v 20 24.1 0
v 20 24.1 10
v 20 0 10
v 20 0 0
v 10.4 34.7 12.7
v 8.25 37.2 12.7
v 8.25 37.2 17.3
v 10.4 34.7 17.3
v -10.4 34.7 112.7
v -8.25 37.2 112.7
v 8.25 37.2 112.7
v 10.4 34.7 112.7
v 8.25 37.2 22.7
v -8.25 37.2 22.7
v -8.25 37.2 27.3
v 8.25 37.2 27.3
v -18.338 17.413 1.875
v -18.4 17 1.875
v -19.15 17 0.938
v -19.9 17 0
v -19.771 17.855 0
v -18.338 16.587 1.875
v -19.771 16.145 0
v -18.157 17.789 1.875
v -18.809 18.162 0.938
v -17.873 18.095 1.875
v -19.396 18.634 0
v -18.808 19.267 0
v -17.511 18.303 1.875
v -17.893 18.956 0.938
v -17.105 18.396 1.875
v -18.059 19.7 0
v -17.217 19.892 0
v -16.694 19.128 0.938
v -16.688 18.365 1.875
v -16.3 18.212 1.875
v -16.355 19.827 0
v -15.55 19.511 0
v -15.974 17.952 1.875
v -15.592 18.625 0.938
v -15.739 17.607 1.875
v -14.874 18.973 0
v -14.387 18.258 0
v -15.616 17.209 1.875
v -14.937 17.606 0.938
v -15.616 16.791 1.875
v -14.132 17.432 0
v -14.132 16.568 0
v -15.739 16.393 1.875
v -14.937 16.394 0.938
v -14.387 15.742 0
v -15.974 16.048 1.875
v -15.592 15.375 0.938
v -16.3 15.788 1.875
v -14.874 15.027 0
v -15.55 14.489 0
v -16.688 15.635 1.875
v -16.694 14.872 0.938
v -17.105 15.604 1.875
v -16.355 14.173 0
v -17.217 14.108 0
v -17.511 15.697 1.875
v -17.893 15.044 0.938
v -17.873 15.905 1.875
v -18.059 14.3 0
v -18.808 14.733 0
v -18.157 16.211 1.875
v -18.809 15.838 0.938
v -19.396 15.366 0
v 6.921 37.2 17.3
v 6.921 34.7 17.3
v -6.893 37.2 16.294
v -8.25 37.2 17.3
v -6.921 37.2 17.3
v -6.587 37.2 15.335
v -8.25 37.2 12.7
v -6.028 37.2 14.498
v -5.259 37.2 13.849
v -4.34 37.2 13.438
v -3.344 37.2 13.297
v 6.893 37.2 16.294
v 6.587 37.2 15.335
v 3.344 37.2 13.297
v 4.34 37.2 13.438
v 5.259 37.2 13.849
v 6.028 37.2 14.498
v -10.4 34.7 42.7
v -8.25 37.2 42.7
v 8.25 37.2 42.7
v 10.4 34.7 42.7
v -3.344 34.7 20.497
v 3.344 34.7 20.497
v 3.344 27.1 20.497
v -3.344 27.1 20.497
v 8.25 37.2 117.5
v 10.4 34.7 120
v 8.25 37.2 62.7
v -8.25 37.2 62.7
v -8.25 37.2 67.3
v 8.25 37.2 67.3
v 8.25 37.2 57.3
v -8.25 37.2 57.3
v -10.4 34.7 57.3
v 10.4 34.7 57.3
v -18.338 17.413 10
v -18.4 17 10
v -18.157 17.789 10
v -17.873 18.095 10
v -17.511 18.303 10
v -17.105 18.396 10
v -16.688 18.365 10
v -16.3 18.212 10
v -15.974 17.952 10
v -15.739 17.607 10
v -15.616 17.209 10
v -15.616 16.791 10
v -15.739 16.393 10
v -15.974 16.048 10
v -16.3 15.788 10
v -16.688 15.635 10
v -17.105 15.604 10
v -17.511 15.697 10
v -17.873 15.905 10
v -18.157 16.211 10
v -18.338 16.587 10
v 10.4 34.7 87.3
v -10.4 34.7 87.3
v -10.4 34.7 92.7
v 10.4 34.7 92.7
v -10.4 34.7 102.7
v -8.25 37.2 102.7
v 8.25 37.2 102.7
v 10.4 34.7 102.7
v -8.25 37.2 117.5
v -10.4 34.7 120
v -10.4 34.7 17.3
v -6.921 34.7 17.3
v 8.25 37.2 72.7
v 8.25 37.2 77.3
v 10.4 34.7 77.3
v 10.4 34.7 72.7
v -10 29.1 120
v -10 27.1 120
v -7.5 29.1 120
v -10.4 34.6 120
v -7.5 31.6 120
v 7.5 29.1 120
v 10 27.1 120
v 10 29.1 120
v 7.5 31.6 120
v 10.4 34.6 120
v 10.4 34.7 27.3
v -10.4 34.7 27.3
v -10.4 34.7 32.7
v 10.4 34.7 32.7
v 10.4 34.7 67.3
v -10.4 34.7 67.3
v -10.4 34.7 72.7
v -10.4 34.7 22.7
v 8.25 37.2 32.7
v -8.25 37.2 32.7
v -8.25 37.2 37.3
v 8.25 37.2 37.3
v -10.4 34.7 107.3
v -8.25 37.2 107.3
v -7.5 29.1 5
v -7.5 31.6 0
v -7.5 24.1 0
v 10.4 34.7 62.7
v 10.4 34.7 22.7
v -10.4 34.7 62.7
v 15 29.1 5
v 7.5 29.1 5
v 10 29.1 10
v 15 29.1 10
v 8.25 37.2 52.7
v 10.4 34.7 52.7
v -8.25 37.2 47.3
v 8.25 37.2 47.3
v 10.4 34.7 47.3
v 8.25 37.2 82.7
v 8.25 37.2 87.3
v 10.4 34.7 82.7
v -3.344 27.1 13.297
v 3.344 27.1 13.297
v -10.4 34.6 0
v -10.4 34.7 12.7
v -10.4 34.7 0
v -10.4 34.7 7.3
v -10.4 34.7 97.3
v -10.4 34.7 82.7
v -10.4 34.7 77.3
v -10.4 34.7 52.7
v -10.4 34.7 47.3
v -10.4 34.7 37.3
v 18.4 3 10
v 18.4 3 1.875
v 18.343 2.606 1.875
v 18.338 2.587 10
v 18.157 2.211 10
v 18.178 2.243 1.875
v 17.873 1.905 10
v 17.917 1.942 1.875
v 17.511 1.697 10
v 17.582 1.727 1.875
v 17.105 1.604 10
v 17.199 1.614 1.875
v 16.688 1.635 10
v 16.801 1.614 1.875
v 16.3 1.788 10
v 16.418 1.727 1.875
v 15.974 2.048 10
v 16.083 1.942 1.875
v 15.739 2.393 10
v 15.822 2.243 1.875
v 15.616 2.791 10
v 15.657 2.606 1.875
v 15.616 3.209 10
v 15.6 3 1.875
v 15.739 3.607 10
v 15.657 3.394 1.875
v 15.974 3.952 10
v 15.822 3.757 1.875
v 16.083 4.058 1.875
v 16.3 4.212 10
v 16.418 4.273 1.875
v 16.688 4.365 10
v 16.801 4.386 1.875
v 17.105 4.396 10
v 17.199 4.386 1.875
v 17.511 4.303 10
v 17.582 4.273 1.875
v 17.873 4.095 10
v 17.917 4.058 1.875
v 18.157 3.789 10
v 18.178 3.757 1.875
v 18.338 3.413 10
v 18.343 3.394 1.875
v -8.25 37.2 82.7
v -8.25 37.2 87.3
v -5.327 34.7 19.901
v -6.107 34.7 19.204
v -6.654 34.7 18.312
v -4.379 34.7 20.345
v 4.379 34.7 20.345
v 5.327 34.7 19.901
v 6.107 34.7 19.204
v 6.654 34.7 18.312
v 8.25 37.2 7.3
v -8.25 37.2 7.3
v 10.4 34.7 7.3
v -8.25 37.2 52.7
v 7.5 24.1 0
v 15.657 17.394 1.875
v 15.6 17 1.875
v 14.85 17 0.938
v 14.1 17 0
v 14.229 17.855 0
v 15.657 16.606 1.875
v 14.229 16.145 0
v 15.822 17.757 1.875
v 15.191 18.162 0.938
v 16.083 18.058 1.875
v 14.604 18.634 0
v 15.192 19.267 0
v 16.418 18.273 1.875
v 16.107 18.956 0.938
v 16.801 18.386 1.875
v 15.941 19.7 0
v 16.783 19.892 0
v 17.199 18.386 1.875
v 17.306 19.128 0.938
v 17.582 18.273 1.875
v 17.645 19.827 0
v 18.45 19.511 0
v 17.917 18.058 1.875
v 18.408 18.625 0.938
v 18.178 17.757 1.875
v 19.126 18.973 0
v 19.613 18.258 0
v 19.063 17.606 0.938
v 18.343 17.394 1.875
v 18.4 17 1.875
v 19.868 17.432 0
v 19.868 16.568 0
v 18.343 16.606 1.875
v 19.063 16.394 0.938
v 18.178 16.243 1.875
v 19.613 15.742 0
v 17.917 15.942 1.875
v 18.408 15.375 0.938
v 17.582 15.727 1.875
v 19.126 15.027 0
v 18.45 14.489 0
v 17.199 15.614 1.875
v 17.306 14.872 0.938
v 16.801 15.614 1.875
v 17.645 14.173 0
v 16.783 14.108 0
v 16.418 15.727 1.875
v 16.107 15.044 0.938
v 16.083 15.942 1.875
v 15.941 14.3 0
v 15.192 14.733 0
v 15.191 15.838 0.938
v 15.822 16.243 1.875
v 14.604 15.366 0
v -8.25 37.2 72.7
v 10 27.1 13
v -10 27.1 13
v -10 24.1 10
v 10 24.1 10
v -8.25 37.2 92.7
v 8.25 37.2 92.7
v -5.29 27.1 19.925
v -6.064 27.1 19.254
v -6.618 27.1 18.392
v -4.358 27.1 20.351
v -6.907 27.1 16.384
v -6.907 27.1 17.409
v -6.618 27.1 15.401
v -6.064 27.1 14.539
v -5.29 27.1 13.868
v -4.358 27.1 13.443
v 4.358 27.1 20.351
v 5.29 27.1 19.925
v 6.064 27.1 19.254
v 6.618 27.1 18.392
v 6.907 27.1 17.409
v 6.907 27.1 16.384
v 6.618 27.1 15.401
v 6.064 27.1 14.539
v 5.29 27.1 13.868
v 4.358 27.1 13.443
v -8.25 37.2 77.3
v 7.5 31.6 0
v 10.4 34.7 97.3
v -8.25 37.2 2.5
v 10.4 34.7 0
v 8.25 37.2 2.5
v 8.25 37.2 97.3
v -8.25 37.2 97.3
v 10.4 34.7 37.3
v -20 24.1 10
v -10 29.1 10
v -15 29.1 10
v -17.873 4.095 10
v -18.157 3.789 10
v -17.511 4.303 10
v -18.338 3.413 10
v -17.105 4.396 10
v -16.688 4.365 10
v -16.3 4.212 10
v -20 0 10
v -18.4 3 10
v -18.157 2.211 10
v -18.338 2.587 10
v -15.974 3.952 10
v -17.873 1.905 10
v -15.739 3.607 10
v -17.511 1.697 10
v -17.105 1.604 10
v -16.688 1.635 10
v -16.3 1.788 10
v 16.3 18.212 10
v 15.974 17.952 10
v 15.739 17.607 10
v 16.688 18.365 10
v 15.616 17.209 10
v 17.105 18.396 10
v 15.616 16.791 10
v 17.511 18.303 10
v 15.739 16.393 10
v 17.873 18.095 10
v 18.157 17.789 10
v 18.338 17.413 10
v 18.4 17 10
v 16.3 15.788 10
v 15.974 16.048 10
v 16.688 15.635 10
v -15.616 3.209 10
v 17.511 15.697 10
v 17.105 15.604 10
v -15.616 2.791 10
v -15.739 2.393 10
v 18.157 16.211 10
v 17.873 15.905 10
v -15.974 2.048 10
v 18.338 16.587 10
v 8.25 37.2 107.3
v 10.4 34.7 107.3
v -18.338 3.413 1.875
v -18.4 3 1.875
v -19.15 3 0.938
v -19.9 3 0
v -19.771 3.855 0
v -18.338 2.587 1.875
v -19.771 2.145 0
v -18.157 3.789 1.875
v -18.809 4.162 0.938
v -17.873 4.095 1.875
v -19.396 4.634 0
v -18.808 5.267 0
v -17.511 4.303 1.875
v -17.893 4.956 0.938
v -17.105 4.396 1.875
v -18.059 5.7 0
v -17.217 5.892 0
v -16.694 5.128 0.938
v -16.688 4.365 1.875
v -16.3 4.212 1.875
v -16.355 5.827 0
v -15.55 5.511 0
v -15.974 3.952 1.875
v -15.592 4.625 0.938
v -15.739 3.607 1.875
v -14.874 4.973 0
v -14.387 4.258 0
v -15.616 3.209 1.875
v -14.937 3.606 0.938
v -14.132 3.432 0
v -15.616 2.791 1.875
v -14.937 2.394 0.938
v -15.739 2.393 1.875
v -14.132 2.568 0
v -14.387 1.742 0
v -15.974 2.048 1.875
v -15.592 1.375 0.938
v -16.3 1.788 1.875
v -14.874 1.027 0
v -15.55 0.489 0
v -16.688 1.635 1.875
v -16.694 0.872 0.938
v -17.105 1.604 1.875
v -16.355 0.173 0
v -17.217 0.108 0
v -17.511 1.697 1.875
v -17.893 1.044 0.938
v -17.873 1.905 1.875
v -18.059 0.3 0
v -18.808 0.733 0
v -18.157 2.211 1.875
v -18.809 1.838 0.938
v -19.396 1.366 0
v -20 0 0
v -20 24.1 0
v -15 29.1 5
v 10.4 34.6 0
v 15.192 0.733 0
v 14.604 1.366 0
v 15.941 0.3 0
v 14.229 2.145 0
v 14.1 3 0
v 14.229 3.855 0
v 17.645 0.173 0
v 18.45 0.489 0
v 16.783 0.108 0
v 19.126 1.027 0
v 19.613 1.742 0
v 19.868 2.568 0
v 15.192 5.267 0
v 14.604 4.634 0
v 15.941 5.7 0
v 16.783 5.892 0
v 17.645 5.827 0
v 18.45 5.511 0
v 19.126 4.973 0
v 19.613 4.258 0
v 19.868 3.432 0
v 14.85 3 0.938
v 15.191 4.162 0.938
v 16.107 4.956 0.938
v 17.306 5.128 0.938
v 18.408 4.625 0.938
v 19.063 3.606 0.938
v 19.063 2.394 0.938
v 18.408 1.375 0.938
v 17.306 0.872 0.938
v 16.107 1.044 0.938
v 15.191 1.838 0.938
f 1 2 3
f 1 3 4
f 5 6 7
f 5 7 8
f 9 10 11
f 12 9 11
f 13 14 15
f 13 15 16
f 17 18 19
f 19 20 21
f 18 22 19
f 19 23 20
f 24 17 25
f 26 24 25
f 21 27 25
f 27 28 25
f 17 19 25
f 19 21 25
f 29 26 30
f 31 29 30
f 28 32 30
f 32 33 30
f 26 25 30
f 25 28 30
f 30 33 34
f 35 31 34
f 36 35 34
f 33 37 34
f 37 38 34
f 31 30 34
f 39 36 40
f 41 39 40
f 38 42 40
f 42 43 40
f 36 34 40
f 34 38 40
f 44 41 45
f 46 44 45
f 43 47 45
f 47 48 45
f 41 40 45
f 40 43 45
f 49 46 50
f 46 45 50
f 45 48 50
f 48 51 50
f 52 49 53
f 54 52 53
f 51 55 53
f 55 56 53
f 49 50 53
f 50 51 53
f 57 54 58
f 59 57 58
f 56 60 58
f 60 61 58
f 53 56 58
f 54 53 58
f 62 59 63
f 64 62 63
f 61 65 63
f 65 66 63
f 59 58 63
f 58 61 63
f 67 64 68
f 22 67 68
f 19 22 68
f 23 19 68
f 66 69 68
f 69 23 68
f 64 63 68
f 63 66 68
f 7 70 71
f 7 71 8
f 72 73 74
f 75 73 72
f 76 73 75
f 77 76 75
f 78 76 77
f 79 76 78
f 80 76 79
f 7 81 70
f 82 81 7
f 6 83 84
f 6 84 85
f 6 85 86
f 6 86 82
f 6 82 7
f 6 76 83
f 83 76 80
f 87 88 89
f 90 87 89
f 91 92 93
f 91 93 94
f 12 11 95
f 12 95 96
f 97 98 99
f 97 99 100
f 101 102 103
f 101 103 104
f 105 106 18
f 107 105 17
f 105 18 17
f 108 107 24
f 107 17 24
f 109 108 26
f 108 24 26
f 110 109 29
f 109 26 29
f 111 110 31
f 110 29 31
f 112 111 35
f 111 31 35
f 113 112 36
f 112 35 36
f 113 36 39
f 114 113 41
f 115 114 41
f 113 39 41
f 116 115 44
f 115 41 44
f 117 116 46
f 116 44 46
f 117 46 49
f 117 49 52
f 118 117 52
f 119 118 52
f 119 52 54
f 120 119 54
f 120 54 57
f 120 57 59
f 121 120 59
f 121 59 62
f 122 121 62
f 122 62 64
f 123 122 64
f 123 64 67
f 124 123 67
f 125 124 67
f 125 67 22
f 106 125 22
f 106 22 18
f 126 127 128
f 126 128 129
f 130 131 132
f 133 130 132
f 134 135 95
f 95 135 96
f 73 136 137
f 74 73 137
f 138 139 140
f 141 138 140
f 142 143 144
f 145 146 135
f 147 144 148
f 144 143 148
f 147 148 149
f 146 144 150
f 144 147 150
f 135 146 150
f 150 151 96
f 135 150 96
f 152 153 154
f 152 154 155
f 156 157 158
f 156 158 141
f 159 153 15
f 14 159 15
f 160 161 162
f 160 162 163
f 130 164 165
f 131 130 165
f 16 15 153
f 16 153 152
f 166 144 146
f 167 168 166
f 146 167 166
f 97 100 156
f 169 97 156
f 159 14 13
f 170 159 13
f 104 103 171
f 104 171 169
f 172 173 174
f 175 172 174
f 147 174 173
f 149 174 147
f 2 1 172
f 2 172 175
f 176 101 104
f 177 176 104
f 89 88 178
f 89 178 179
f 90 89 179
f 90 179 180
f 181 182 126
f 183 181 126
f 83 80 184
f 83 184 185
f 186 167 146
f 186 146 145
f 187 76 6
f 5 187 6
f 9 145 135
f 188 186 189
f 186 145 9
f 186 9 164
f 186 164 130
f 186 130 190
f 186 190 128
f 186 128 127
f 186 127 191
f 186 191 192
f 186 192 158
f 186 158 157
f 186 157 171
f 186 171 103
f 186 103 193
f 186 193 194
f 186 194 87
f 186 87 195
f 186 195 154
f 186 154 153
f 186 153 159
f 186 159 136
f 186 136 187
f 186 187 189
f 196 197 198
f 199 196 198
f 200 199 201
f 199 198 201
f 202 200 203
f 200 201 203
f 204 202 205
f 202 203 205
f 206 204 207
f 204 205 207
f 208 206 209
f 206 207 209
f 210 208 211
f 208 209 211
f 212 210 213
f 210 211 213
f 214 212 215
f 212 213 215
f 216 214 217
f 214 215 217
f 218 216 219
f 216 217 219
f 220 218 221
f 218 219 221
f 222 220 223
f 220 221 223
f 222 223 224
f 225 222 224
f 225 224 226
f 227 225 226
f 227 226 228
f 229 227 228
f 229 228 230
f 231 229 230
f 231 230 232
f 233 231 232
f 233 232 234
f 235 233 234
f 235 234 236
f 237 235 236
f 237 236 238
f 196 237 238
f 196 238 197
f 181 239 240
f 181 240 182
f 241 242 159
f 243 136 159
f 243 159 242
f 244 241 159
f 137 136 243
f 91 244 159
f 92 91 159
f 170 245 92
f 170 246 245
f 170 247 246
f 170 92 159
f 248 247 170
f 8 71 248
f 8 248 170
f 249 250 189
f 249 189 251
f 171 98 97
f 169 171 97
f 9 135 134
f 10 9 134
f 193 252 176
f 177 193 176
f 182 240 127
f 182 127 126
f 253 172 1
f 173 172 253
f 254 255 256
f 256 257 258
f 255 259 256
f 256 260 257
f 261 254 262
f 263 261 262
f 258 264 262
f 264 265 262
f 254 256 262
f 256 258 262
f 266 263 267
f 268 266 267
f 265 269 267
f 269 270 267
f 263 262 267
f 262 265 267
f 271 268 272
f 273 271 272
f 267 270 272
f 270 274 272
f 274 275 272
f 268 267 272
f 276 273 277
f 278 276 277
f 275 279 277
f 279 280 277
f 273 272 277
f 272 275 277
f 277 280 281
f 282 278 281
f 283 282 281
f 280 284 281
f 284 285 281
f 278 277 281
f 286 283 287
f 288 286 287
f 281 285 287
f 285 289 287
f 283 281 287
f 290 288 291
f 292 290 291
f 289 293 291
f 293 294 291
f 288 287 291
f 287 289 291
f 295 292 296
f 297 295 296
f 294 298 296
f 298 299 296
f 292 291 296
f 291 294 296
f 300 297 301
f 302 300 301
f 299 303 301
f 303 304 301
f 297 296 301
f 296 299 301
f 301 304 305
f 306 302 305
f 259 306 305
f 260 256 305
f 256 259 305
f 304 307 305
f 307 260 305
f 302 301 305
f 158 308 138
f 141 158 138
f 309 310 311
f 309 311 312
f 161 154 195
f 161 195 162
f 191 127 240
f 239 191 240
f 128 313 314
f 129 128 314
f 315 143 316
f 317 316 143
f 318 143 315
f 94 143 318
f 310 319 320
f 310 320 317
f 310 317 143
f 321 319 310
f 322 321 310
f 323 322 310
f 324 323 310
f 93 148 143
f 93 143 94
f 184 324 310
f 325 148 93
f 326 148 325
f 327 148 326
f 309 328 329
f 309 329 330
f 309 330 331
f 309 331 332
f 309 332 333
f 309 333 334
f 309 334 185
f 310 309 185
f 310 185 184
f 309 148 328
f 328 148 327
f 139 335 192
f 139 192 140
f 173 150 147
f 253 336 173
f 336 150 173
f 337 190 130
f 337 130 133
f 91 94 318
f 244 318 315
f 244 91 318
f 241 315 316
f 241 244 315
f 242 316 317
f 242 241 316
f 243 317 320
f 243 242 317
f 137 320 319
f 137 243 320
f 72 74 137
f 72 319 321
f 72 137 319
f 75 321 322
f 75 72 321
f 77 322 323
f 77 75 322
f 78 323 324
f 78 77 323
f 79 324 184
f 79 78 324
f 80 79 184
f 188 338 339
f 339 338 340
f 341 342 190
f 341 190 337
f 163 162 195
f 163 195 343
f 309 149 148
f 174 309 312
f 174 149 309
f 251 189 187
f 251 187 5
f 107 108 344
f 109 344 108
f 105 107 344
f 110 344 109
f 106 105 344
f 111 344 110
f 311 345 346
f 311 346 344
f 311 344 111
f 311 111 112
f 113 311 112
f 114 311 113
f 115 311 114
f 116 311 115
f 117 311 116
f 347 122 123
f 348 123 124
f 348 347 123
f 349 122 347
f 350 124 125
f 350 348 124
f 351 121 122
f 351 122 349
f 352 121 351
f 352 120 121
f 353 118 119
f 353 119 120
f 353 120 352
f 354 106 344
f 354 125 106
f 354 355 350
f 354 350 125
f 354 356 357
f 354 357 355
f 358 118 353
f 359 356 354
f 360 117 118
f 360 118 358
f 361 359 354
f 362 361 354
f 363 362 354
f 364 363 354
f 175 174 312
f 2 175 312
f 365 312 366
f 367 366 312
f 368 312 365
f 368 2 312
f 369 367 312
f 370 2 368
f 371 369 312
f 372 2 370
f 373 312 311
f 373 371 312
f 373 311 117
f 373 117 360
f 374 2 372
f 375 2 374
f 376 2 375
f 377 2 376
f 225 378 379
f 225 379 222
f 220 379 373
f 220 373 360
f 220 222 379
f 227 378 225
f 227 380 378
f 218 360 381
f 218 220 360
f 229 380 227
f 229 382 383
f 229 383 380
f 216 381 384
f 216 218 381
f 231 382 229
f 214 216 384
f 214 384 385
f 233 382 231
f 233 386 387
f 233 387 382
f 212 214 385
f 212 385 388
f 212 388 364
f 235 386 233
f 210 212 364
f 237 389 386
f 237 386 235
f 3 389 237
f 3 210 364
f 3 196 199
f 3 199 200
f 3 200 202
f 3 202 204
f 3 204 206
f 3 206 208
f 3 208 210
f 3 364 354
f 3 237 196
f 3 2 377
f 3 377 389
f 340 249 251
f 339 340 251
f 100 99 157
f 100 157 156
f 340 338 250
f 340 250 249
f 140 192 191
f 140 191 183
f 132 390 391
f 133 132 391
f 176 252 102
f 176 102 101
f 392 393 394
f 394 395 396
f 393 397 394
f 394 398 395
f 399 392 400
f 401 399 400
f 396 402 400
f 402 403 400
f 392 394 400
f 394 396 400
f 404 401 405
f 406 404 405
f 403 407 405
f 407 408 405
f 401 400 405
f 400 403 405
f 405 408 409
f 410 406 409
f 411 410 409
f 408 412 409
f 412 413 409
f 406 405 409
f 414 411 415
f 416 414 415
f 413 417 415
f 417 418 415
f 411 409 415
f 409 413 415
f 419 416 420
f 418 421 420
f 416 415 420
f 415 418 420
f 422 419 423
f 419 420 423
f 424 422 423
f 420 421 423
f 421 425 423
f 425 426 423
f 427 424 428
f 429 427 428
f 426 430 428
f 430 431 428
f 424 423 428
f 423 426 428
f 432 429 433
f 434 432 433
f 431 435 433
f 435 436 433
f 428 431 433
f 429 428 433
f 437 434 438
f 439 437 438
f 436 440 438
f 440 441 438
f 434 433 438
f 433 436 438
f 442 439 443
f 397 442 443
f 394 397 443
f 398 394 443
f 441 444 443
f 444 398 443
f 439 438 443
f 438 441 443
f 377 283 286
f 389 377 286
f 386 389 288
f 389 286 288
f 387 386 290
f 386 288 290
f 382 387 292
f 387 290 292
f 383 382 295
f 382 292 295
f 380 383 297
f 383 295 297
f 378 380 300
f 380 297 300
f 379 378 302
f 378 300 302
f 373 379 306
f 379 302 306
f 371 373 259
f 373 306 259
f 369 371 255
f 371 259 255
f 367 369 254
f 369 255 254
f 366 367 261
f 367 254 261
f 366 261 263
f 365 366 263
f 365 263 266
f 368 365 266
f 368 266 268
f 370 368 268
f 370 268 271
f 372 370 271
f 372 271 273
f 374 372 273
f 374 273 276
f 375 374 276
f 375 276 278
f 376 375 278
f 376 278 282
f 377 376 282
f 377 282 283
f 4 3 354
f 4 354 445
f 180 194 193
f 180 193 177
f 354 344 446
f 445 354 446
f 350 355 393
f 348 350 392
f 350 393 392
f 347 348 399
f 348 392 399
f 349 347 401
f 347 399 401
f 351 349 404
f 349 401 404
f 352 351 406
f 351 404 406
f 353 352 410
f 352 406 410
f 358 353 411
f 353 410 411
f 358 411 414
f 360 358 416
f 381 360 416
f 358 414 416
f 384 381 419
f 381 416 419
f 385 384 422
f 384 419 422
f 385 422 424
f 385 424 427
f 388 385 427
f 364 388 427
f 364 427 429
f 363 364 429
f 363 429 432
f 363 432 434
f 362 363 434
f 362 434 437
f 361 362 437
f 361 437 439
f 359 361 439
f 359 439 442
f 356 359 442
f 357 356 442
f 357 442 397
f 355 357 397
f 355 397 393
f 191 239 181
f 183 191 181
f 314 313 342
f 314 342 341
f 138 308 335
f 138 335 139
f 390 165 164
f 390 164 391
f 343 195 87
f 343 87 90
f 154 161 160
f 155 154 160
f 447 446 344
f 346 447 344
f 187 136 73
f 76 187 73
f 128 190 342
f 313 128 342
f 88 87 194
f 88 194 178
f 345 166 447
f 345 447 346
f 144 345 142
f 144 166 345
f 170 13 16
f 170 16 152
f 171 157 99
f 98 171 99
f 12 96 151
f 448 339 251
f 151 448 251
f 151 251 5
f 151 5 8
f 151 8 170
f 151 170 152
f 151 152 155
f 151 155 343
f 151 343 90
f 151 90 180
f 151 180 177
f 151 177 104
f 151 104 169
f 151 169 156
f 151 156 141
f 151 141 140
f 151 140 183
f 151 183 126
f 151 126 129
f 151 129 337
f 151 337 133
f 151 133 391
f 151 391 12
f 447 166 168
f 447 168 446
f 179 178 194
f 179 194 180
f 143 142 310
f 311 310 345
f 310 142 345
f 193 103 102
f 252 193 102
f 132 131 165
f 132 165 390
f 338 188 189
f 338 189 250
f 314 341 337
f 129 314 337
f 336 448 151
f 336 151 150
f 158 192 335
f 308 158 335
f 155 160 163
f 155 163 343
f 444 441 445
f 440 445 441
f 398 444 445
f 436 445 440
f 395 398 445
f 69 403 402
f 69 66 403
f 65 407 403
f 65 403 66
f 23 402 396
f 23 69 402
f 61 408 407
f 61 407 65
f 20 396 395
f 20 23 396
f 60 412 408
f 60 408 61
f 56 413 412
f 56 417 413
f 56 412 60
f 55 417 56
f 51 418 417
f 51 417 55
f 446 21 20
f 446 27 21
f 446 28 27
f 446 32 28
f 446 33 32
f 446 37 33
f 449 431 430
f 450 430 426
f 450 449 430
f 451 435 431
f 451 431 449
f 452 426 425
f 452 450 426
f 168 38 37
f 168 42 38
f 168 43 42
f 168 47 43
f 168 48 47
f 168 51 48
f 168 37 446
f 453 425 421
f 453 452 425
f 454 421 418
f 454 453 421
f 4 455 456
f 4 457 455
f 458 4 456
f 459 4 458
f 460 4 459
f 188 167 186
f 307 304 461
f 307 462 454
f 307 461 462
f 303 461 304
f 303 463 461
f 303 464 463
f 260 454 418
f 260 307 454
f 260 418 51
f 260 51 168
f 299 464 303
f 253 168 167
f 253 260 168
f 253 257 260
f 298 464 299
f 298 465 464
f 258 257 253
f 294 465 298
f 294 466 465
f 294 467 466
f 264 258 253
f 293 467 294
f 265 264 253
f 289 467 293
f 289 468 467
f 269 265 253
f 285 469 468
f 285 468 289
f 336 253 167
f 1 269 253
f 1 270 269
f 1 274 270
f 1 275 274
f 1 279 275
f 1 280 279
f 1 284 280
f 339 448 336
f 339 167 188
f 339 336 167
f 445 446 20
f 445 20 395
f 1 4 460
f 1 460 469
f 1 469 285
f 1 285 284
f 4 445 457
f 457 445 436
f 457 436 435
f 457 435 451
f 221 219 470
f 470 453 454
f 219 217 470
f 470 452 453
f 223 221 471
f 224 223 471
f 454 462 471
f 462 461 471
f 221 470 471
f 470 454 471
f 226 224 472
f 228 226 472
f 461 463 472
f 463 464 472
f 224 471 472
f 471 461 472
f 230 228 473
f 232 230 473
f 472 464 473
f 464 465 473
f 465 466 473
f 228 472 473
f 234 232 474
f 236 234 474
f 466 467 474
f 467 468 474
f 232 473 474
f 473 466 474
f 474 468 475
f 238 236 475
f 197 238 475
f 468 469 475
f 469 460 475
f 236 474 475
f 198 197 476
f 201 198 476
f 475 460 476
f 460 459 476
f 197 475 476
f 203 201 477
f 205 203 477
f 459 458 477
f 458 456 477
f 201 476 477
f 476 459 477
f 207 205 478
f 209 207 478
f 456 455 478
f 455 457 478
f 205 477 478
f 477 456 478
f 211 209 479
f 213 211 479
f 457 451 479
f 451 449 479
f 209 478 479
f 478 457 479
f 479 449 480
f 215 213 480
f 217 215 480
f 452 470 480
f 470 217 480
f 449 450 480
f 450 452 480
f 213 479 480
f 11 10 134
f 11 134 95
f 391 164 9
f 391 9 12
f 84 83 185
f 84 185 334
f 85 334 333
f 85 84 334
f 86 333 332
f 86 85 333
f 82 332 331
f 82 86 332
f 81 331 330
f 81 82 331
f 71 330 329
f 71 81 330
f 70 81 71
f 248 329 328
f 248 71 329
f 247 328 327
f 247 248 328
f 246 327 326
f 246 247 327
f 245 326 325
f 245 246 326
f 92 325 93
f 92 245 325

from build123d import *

# Parameters (mm, degrees)
EXTRUDE_1_DEPTH        = 20
SKETCH_2_R             = 1.4
CUT_EXTRUDE_1_DEPTH    = 40
SKETCH_1_3_W           = 110
SKETCH_1_3_H           = 2
EXTRUDE_2_DEPTH        = 10
EXTRUDE_3_DEPTH        = 120
CUT_EXTRUDE_2_DEPTH    = 20
SKETCH_5_W             = 25
SKETCH_5_H             = 5.4
CUT_EXTRUDE_3_DEPTH    = 2.5
PATTERN_LINEAR_1_COUNT = 11
PATTERN_LINEAR_1_PITCH = 10
CHAMFER_1_SIZE         = 3
SKETCH_6_R             = 2.9
CUT_EXTRUDE_4_DEPTH    = 2
CHAMFER_2_SIZE         = 1.6
CHAMFER_2_SIZE_2       = 2
CHAMFER_3_SIZE         = 2.5
CHAMFER_4_SIZE         = 5


with BuildPart() as part:
    # 스케치1 → 보스-돌출1 (new, symmetric)
    with BuildSketch(Plane(origin=(0, 0, 0), x_dir=(0, 0, -1), z_dir=(1, 0, 0))):
        Polygon((-10, 29.1), (-10, 27.1), (-10, 0), (0, 0), (0, 29.1), align=None)
    extrude(amount=EXTRUDE_1_DEPTH, both=True)

    # 스케치2 → 컷-돌출1 (cut)
    with BuildSketch(Plane.XY):
        with Locations((17, 3)):
            Circle(SKETCH_2_R)
        with Locations((17, 17)):
            Circle(SKETCH_2_R)
        with Locations(Location((-17, 3, 0), (0, 0, 180))):
            Circle(SKETCH_2_R)
        with Locations(Location((-17, 17, 0), (0, 0, 180))):
            Circle(SKETCH_2_R)
    extrude(amount=CUT_EXTRUDE_1_DEPTH, mode=Mode.SUBTRACT)

    # 스케치1<3> → 보스-돌출2 (add, symmetric)
    with BuildSketch(Plane(origin=(0, 0, 0), x_dir=(0, 0, -1), z_dir=(1, 0, 0))):
        with Locations((-65, 28.1)):
            Rectangle(SKETCH_1_3_W, SKETCH_1_3_H)
    extrude(amount=EXTRUDE_2_DEPTH, both=True)

    # 스케치3 → 보스-돌출3 (add)
    with BuildSketch(Plane.XY):
        Polygon((7.5, 29.1), (-7.5, 29.1), (-7.5, 31.6), (-10.4, 34.6), (-10.4, 34.7), (-8.25, 37.2), (8.25, 37.2), (10.4, 34.7), (10.4, 34.6), (7.5, 31.6), align=None)
    extrude(amount=EXTRUDE_3_DEPTH)

    # 스케치4 → 컷-돌출2 (cut)
    with BuildSketch(Plane(origin=(0, 37.2, 0), x_dir=(1, 0, 0), z_dir=(0, 1, 0))):
        with BuildLine():
            Line((-3.343759528, -13.296813629), (3.343759528, -13.296813629))
            ThreePointArc((3.343759528, -13.296813629), (6.943759528, -16.896813629), (3.343759528, -20.496813629))
            Line((3.343759528, -20.496813629), (-3.343759528, -20.496813629))
            ThreePointArc((-3.343759528, -20.496813629), (-6.943759528, -16.896813629), (-3.343759528, -13.296813629))
        make_face()
    extrude(amount=-CUT_EXTRUDE_2_DEPTH, mode=Mode.SUBTRACT)

    # 스케치5 → 컷-돌출3 (cut)
    with BuildSketch(Plane(origin=(0, 37.2, 0), x_dir=(1, 0, 0), z_dir=(0, 1, 0))):
        with Locations((0, -10)):
            Rectangle(SKETCH_5_W, SKETCH_5_H)
    cut_extrude_3 = extrude(amount=-CUT_EXTRUDE_3_DEPTH, mode=Mode.SUBTRACT)

    # 선형 패턴1: 컷-돌출3 ×11
    with Locations(*[(0, 0, i * PATTERN_LINEAR_1_PITCH) for i in range(1, PATTERN_LINEAR_1_COUNT)]):
        add(cut_extrude_3, mode=Mode.SUBTRACT)

    # 모따기1
    chamfer_1_edges = [part.edges().sort_by_distance(p)[0] for p in [
        (0, 27.1, 10),
    ]]
    chamfer(chamfer_1_edges, length=CHAMFER_1_SIZE)

    # 스케치6 → 컷-돌출4 (cut)
    with BuildSketch(Plane(origin=(0, 0, 0), x_dir=(-1, 0, 0), z_dir=(0, 0, -1))):
        with Locations((-17, 3)):
            Circle(SKETCH_6_R)
        with Locations((-17, 17)):
            Circle(SKETCH_6_R)
        with Locations((17, 17)):
            Circle(SKETCH_6_R)
        with Locations((17, 3)):
            Circle(SKETCH_6_R)
    extrude(amount=-CUT_EXTRUDE_4_DEPTH, mode=Mode.SUBTRACT)

    # 모따기2
    # the kernel refuses this chamfer: 2, 1.6 mm, written as the material it adds along each edge
    with BuildSketch(Plane(origin=(17, 3, 2), x_dir=(-1, 0, 0), z_dir=(0, -1, 0))) as chamfer_2_piece_1_section:
        Polygon((2.9 - CHAMFER_2_SIZE, 0), (2.9, CHAMFER_2_SIZE_2), (2.9, 0), align=None)
    chamfer_2_piece_1 = revolve(axis=Axis((17, 3, 2), (0, 0, -1)), mode=Mode.PRIVATE)
    chamfer_2_piece_1 = chamfer_2_piece_1 - Plane(origin=(17, 3, 0.956092246), x_dir=(1, 0, 0), z_dir=(0, 0, -1)) * Cylinder(1.4, 12, mode=Mode.PRIVATE)
    chamfer_2_piece_1 = split(chamfer_2_piece_1, bisect_by=Plane(origin=(19.173240308, 3, 0), z_dir=(0, 0, 1)), keep=Keep.TOP, mode=Mode.PRIVATE)
    add(chamfer_2_piece_1)
    with BuildSketch(Plane(origin=(-17, 3, 2), x_dir=(-1, 0, 0), z_dir=(0, -1, 0))) as chamfer_2_piece_2_section:
        Polygon((2.9 - CHAMFER_2_SIZE, 0), (2.9, CHAMFER_2_SIZE_2), (2.9, 0), align=None)
    chamfer_2_piece_2 = revolve(axis=Axis((-17, 3, 2), (0, 0, -1)), mode=Mode.PRIVATE)
    chamfer_2_piece_2 = chamfer_2_piece_2 - Plane(origin=(-17, 3, 0.956092246), x_dir=(-1, 0, 0), z_dir=(0, 0, -1)) * Cylinder(1.4, 12, mode=Mode.PRIVATE)
    chamfer_2_piece_2 = split(chamfer_2_piece_2, bisect_by=Plane(origin=(-14.826759692, 3, 0), z_dir=(0, 0, 1)), keep=Keep.TOP, mode=Mode.PRIVATE)
    add(chamfer_2_piece_2)
    with BuildSketch(Plane(origin=(-17, 17, 2), x_dir=(-1, 0, 0), z_dir=(0, -1, 0))) as chamfer_2_piece_3_section:
        Polygon((2.9 - CHAMFER_2_SIZE, 0), (2.9, CHAMFER_2_SIZE_2), (2.9, 0), align=None)
    chamfer_2_piece_3 = revolve(axis=Axis((-17, 17, 2), (0, 0, -1)), mode=Mode.PRIVATE)
    chamfer_2_piece_3 = chamfer_2_piece_3 - Plane(origin=(-17, 17, 0.956092246), x_dir=(-1, 0, 0), z_dir=(0, 0, -1)) * Cylinder(1.4, 12, mode=Mode.PRIVATE)
    chamfer_2_piece_3 = split(chamfer_2_piece_3, bisect_by=Plane(origin=(-14.826759692, 17, 0), z_dir=(0, 0, 1)), keep=Keep.TOP, mode=Mode.PRIVATE)
    add(chamfer_2_piece_3)
    with BuildSketch(Plane(origin=(17, 17, 2), x_dir=(-1, 0, 0), z_dir=(0, -1, 0))) as chamfer_2_piece_4_section:
        Polygon((2.9 - CHAMFER_2_SIZE, 0), (2.9, CHAMFER_2_SIZE_2), (2.9, 0), align=None)
    chamfer_2_piece_4 = revolve(axis=Axis((17, 17, 2), (0, 0, -1)), mode=Mode.PRIVATE)
    chamfer_2_piece_4 = chamfer_2_piece_4 - Plane(origin=(17, 17, 0.956092246), x_dir=(1, 0, 0), z_dir=(0, 0, -1)) * Cylinder(1.4, 12, mode=Mode.PRIVATE)
    chamfer_2_piece_4 = split(chamfer_2_piece_4, bisect_by=Plane(origin=(19.173240308, 17, 0), z_dir=(0, 0, 1)), keep=Keep.TOP, mode=Mode.PRIVATE)
    add(chamfer_2_piece_4)

    # 모따기3
    chamfer_3_edges = [part.edges().sort_by_distance(p)[0] for p in [
        (0, 37.2, 120),
        (0, 37.2, 0),
    ]]
    chamfer(chamfer_3_edges, length=CHAMFER_3_SIZE)

    # 모따기4
    chamfer_4_edges = [part.edges().sort_by_distance(p)[0] for p in [
        (-13.75, 29.1, 0),
        (-20, 29.1, 5),
        (20, 29.1, 5),
        (13.75, 29.1, 0),
    ]]
    chamfer(chamfer_4_edges, length=CHAMFER_4_SIZE)


solid = part.part
